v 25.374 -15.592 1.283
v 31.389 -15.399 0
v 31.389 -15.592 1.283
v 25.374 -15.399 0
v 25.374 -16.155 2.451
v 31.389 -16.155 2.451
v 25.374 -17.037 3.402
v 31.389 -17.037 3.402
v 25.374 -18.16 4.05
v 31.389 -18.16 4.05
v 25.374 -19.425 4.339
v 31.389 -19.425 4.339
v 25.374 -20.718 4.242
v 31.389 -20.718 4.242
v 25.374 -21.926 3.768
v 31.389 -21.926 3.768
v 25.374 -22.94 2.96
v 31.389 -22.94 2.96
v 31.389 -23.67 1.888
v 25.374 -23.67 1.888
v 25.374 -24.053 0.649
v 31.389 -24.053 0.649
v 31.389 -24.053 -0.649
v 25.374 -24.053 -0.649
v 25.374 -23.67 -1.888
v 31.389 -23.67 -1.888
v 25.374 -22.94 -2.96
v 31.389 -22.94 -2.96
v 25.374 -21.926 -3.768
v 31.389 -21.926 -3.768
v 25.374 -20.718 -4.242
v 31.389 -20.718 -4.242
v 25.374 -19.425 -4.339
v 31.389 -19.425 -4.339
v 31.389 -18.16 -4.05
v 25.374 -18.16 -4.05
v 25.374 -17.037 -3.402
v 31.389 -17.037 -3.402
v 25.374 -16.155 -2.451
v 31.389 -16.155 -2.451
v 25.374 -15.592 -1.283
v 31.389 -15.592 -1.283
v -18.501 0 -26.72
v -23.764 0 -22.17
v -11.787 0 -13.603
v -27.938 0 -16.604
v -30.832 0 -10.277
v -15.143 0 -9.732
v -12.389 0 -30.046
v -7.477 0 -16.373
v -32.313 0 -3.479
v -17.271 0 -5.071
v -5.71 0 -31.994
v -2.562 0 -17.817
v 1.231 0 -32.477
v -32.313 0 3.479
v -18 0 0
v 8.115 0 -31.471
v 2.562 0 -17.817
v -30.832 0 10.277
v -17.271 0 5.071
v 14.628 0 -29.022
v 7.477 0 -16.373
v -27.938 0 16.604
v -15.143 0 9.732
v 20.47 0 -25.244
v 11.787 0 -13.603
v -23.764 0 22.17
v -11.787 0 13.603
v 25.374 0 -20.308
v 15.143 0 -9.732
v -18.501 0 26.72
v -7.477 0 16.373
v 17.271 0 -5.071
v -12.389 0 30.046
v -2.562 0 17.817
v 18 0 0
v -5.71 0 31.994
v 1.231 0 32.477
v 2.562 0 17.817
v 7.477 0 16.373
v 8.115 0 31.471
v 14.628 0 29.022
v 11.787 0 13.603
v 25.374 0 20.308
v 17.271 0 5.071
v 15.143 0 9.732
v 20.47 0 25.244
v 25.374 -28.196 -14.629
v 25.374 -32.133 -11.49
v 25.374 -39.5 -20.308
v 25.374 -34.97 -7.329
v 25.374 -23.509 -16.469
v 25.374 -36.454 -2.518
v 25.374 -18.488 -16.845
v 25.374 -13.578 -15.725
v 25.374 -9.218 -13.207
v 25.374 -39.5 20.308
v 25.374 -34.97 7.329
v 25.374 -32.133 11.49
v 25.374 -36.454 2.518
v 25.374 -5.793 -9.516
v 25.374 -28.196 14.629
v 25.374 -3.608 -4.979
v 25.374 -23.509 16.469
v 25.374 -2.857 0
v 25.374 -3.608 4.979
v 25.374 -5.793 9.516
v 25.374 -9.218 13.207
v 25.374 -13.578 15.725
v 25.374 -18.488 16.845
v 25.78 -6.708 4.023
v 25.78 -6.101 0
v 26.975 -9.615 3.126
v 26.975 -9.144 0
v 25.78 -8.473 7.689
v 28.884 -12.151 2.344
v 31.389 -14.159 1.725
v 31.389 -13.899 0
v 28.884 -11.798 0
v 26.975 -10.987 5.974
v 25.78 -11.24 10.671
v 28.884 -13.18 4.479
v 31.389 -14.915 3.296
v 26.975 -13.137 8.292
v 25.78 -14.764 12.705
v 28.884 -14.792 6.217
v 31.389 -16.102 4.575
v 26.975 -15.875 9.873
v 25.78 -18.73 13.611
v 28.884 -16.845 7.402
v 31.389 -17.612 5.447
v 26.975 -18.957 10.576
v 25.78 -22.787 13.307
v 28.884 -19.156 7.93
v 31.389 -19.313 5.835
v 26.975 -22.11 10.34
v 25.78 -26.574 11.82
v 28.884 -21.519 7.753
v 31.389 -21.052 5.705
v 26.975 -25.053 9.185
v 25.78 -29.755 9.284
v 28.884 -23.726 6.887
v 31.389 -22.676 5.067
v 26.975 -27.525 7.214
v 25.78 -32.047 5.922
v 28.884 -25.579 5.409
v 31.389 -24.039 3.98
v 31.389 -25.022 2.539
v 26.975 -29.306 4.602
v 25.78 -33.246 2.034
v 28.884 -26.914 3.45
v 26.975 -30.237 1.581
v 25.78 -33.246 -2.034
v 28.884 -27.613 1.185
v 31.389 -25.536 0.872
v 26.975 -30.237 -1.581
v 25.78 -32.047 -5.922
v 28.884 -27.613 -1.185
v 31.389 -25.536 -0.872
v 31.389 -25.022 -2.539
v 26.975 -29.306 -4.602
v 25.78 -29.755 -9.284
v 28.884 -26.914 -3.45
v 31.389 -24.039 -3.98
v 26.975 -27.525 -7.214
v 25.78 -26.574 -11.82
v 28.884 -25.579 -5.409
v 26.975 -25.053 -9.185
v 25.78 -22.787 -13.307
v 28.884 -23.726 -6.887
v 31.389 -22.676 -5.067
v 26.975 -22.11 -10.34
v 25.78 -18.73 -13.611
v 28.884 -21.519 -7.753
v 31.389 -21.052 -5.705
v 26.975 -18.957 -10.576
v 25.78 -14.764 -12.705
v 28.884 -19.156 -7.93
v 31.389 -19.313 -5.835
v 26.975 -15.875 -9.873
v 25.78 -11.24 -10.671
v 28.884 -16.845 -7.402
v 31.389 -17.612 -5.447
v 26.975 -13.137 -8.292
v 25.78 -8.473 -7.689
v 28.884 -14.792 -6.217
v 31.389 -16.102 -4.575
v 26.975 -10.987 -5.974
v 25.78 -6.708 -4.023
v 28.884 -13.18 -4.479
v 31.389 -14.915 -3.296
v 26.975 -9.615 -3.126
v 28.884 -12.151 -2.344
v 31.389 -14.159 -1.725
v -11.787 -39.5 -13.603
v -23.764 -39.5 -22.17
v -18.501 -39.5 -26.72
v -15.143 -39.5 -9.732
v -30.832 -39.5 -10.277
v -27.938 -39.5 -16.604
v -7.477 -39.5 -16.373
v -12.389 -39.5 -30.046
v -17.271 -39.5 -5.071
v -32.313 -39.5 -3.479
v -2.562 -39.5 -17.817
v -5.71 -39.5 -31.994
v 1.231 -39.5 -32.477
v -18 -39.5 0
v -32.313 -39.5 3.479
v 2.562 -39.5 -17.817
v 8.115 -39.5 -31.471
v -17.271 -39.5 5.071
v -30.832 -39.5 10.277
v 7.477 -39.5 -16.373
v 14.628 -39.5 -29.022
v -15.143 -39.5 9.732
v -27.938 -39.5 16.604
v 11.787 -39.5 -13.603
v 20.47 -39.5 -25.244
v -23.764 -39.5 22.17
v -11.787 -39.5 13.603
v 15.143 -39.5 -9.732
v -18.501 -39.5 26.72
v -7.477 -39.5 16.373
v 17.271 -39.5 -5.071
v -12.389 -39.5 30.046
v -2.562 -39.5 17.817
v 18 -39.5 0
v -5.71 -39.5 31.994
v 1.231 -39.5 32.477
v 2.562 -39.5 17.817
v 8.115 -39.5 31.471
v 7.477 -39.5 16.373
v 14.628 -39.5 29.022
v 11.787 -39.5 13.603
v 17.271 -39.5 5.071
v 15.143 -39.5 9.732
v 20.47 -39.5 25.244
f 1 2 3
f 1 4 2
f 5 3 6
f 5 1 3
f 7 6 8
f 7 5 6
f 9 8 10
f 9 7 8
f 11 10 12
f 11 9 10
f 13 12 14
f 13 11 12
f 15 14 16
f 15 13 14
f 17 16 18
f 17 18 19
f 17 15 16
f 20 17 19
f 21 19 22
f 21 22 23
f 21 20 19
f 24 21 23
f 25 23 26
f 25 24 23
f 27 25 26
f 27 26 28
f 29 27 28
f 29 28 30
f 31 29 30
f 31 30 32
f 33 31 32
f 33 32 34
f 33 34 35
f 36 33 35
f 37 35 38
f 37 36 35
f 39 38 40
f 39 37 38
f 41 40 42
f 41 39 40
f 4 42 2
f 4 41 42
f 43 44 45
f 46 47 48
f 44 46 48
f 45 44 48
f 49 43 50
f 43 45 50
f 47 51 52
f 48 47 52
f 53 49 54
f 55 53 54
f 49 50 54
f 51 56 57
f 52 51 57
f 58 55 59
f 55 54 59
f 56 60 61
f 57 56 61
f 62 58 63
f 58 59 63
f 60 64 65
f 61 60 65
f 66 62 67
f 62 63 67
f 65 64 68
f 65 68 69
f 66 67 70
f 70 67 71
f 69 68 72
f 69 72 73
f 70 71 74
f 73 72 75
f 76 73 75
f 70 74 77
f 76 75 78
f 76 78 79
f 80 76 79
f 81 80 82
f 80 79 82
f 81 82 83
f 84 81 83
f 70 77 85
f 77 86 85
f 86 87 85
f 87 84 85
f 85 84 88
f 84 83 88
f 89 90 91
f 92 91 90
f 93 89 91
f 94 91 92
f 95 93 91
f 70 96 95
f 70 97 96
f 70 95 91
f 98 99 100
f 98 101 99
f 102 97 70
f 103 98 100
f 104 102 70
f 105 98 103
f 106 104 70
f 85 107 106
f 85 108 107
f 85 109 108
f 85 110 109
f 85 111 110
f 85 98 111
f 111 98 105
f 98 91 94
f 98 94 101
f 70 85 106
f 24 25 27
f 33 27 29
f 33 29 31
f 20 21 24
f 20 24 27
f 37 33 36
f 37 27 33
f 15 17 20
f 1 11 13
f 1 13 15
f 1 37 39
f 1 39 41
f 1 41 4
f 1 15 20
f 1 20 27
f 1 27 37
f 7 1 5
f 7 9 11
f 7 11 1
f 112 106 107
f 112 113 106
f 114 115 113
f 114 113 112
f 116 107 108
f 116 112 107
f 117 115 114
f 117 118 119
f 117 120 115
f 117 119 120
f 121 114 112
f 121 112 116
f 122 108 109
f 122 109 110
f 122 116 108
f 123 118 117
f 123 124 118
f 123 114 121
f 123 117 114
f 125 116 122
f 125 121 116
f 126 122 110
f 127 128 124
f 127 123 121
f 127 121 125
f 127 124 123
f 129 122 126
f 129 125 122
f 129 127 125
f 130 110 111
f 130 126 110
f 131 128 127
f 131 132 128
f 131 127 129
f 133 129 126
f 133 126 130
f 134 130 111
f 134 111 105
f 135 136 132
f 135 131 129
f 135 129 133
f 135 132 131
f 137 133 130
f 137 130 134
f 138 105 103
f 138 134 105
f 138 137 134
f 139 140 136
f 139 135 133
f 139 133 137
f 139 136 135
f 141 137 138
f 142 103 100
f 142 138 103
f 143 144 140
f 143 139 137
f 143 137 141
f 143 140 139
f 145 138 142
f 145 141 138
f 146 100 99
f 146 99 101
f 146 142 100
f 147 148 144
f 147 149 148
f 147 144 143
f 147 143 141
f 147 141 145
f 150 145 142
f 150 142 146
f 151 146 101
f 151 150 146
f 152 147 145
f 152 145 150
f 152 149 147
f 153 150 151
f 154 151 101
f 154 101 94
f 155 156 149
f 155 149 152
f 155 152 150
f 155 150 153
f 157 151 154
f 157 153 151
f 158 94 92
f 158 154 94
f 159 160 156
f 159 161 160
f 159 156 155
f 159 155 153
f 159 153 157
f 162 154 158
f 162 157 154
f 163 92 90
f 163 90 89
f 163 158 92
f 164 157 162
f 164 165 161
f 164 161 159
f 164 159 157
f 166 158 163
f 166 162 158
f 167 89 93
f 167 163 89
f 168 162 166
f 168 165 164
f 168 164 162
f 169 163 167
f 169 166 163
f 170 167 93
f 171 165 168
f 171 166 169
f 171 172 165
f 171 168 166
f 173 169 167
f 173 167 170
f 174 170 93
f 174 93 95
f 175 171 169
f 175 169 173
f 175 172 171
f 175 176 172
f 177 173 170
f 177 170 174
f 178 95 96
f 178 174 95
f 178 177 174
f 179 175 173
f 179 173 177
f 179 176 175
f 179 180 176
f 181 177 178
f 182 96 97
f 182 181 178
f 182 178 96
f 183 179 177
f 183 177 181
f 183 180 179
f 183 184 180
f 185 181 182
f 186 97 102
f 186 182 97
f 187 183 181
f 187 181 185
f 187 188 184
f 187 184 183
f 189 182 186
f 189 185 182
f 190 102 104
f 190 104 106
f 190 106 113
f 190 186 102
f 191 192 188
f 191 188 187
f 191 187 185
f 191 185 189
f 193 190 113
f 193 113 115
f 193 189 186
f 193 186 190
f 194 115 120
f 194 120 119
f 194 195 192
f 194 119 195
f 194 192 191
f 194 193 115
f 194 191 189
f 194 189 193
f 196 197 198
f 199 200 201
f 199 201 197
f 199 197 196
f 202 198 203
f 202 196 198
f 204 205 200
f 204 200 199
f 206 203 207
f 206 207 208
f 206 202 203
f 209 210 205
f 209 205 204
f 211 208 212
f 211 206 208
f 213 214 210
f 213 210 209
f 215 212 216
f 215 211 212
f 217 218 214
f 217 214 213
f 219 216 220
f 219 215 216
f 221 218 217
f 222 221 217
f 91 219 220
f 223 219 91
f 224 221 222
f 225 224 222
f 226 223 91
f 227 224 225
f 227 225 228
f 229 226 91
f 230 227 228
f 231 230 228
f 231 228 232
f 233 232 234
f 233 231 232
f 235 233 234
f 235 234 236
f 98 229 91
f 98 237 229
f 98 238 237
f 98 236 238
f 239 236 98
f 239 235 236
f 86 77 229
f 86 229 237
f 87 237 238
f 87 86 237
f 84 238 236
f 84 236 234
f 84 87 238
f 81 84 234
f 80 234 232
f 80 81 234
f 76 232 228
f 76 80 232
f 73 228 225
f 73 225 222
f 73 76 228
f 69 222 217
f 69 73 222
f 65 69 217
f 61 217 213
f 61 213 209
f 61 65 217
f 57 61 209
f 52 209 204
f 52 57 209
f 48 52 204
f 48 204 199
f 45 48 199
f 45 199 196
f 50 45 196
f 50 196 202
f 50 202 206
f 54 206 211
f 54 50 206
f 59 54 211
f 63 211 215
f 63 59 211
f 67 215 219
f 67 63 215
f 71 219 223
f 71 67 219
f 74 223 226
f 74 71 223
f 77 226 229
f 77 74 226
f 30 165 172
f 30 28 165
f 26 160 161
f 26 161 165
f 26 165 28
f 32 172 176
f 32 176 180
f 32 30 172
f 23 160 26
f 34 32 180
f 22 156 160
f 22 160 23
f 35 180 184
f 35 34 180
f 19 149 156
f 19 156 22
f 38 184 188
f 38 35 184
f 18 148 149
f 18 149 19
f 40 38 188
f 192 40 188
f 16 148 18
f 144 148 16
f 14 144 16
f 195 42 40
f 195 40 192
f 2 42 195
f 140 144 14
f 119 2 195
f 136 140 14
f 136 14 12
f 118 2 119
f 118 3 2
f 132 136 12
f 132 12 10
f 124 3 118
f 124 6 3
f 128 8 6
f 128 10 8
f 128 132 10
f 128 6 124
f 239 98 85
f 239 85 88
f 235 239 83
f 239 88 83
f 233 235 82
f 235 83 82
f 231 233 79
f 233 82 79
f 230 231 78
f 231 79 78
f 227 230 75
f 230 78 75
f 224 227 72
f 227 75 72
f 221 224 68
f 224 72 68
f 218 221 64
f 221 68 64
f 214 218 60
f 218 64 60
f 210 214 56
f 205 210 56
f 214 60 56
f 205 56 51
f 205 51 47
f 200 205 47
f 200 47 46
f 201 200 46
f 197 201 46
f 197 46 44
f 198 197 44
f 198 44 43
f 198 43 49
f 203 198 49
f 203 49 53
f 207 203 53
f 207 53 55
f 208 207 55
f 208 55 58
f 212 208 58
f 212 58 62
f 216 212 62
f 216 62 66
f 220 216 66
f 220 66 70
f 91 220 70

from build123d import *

# Parameters (mm, degrees)
F0_R     = 32.5
F0_R_2   = 18
F1_DEPTH = 39.5


with BuildPart() as f1:
    # F0 (on Front) → F1 (new body)
    with BuildSketch(Plane.XZ):
        Circle(F0_R)
        Circle(F0_R_2, mode=Mode.SUBTRACT)
    extrude(amount=F1_DEPTH)

    # F2 (on Top) → F3 (revolve, cut)
    with BuildSketch(Plane.XY):
        with BuildLine():
            Line((31.389073, -15.398732), (25.373673, -15.398732))
            Line((25.373673, -15.398732), (25.373673, -19.75))
            Line((25.373673, -19.75), (38.296562, -19.75))
            Line((38.296562, -19.75), (38.296562, 9.950572))
            Line((38.296562, 9.950572), (25.373673, 9.950572))
            Line((25.373673, 9.950572), (25.373673, -2.857341))
            ThreePointArc((25.373673, -2.857341), (26.975102, -9.14418), (31.389073, -13.898732))
            Line((31.389073, -13.898732), (31.389073, -15.398732))
        make_face()
    revolve(axis=Axis((5.5, -19.75, 0), (1, 0, 0)), mode=Mode.SUBTRACT)


solid = f1.part
